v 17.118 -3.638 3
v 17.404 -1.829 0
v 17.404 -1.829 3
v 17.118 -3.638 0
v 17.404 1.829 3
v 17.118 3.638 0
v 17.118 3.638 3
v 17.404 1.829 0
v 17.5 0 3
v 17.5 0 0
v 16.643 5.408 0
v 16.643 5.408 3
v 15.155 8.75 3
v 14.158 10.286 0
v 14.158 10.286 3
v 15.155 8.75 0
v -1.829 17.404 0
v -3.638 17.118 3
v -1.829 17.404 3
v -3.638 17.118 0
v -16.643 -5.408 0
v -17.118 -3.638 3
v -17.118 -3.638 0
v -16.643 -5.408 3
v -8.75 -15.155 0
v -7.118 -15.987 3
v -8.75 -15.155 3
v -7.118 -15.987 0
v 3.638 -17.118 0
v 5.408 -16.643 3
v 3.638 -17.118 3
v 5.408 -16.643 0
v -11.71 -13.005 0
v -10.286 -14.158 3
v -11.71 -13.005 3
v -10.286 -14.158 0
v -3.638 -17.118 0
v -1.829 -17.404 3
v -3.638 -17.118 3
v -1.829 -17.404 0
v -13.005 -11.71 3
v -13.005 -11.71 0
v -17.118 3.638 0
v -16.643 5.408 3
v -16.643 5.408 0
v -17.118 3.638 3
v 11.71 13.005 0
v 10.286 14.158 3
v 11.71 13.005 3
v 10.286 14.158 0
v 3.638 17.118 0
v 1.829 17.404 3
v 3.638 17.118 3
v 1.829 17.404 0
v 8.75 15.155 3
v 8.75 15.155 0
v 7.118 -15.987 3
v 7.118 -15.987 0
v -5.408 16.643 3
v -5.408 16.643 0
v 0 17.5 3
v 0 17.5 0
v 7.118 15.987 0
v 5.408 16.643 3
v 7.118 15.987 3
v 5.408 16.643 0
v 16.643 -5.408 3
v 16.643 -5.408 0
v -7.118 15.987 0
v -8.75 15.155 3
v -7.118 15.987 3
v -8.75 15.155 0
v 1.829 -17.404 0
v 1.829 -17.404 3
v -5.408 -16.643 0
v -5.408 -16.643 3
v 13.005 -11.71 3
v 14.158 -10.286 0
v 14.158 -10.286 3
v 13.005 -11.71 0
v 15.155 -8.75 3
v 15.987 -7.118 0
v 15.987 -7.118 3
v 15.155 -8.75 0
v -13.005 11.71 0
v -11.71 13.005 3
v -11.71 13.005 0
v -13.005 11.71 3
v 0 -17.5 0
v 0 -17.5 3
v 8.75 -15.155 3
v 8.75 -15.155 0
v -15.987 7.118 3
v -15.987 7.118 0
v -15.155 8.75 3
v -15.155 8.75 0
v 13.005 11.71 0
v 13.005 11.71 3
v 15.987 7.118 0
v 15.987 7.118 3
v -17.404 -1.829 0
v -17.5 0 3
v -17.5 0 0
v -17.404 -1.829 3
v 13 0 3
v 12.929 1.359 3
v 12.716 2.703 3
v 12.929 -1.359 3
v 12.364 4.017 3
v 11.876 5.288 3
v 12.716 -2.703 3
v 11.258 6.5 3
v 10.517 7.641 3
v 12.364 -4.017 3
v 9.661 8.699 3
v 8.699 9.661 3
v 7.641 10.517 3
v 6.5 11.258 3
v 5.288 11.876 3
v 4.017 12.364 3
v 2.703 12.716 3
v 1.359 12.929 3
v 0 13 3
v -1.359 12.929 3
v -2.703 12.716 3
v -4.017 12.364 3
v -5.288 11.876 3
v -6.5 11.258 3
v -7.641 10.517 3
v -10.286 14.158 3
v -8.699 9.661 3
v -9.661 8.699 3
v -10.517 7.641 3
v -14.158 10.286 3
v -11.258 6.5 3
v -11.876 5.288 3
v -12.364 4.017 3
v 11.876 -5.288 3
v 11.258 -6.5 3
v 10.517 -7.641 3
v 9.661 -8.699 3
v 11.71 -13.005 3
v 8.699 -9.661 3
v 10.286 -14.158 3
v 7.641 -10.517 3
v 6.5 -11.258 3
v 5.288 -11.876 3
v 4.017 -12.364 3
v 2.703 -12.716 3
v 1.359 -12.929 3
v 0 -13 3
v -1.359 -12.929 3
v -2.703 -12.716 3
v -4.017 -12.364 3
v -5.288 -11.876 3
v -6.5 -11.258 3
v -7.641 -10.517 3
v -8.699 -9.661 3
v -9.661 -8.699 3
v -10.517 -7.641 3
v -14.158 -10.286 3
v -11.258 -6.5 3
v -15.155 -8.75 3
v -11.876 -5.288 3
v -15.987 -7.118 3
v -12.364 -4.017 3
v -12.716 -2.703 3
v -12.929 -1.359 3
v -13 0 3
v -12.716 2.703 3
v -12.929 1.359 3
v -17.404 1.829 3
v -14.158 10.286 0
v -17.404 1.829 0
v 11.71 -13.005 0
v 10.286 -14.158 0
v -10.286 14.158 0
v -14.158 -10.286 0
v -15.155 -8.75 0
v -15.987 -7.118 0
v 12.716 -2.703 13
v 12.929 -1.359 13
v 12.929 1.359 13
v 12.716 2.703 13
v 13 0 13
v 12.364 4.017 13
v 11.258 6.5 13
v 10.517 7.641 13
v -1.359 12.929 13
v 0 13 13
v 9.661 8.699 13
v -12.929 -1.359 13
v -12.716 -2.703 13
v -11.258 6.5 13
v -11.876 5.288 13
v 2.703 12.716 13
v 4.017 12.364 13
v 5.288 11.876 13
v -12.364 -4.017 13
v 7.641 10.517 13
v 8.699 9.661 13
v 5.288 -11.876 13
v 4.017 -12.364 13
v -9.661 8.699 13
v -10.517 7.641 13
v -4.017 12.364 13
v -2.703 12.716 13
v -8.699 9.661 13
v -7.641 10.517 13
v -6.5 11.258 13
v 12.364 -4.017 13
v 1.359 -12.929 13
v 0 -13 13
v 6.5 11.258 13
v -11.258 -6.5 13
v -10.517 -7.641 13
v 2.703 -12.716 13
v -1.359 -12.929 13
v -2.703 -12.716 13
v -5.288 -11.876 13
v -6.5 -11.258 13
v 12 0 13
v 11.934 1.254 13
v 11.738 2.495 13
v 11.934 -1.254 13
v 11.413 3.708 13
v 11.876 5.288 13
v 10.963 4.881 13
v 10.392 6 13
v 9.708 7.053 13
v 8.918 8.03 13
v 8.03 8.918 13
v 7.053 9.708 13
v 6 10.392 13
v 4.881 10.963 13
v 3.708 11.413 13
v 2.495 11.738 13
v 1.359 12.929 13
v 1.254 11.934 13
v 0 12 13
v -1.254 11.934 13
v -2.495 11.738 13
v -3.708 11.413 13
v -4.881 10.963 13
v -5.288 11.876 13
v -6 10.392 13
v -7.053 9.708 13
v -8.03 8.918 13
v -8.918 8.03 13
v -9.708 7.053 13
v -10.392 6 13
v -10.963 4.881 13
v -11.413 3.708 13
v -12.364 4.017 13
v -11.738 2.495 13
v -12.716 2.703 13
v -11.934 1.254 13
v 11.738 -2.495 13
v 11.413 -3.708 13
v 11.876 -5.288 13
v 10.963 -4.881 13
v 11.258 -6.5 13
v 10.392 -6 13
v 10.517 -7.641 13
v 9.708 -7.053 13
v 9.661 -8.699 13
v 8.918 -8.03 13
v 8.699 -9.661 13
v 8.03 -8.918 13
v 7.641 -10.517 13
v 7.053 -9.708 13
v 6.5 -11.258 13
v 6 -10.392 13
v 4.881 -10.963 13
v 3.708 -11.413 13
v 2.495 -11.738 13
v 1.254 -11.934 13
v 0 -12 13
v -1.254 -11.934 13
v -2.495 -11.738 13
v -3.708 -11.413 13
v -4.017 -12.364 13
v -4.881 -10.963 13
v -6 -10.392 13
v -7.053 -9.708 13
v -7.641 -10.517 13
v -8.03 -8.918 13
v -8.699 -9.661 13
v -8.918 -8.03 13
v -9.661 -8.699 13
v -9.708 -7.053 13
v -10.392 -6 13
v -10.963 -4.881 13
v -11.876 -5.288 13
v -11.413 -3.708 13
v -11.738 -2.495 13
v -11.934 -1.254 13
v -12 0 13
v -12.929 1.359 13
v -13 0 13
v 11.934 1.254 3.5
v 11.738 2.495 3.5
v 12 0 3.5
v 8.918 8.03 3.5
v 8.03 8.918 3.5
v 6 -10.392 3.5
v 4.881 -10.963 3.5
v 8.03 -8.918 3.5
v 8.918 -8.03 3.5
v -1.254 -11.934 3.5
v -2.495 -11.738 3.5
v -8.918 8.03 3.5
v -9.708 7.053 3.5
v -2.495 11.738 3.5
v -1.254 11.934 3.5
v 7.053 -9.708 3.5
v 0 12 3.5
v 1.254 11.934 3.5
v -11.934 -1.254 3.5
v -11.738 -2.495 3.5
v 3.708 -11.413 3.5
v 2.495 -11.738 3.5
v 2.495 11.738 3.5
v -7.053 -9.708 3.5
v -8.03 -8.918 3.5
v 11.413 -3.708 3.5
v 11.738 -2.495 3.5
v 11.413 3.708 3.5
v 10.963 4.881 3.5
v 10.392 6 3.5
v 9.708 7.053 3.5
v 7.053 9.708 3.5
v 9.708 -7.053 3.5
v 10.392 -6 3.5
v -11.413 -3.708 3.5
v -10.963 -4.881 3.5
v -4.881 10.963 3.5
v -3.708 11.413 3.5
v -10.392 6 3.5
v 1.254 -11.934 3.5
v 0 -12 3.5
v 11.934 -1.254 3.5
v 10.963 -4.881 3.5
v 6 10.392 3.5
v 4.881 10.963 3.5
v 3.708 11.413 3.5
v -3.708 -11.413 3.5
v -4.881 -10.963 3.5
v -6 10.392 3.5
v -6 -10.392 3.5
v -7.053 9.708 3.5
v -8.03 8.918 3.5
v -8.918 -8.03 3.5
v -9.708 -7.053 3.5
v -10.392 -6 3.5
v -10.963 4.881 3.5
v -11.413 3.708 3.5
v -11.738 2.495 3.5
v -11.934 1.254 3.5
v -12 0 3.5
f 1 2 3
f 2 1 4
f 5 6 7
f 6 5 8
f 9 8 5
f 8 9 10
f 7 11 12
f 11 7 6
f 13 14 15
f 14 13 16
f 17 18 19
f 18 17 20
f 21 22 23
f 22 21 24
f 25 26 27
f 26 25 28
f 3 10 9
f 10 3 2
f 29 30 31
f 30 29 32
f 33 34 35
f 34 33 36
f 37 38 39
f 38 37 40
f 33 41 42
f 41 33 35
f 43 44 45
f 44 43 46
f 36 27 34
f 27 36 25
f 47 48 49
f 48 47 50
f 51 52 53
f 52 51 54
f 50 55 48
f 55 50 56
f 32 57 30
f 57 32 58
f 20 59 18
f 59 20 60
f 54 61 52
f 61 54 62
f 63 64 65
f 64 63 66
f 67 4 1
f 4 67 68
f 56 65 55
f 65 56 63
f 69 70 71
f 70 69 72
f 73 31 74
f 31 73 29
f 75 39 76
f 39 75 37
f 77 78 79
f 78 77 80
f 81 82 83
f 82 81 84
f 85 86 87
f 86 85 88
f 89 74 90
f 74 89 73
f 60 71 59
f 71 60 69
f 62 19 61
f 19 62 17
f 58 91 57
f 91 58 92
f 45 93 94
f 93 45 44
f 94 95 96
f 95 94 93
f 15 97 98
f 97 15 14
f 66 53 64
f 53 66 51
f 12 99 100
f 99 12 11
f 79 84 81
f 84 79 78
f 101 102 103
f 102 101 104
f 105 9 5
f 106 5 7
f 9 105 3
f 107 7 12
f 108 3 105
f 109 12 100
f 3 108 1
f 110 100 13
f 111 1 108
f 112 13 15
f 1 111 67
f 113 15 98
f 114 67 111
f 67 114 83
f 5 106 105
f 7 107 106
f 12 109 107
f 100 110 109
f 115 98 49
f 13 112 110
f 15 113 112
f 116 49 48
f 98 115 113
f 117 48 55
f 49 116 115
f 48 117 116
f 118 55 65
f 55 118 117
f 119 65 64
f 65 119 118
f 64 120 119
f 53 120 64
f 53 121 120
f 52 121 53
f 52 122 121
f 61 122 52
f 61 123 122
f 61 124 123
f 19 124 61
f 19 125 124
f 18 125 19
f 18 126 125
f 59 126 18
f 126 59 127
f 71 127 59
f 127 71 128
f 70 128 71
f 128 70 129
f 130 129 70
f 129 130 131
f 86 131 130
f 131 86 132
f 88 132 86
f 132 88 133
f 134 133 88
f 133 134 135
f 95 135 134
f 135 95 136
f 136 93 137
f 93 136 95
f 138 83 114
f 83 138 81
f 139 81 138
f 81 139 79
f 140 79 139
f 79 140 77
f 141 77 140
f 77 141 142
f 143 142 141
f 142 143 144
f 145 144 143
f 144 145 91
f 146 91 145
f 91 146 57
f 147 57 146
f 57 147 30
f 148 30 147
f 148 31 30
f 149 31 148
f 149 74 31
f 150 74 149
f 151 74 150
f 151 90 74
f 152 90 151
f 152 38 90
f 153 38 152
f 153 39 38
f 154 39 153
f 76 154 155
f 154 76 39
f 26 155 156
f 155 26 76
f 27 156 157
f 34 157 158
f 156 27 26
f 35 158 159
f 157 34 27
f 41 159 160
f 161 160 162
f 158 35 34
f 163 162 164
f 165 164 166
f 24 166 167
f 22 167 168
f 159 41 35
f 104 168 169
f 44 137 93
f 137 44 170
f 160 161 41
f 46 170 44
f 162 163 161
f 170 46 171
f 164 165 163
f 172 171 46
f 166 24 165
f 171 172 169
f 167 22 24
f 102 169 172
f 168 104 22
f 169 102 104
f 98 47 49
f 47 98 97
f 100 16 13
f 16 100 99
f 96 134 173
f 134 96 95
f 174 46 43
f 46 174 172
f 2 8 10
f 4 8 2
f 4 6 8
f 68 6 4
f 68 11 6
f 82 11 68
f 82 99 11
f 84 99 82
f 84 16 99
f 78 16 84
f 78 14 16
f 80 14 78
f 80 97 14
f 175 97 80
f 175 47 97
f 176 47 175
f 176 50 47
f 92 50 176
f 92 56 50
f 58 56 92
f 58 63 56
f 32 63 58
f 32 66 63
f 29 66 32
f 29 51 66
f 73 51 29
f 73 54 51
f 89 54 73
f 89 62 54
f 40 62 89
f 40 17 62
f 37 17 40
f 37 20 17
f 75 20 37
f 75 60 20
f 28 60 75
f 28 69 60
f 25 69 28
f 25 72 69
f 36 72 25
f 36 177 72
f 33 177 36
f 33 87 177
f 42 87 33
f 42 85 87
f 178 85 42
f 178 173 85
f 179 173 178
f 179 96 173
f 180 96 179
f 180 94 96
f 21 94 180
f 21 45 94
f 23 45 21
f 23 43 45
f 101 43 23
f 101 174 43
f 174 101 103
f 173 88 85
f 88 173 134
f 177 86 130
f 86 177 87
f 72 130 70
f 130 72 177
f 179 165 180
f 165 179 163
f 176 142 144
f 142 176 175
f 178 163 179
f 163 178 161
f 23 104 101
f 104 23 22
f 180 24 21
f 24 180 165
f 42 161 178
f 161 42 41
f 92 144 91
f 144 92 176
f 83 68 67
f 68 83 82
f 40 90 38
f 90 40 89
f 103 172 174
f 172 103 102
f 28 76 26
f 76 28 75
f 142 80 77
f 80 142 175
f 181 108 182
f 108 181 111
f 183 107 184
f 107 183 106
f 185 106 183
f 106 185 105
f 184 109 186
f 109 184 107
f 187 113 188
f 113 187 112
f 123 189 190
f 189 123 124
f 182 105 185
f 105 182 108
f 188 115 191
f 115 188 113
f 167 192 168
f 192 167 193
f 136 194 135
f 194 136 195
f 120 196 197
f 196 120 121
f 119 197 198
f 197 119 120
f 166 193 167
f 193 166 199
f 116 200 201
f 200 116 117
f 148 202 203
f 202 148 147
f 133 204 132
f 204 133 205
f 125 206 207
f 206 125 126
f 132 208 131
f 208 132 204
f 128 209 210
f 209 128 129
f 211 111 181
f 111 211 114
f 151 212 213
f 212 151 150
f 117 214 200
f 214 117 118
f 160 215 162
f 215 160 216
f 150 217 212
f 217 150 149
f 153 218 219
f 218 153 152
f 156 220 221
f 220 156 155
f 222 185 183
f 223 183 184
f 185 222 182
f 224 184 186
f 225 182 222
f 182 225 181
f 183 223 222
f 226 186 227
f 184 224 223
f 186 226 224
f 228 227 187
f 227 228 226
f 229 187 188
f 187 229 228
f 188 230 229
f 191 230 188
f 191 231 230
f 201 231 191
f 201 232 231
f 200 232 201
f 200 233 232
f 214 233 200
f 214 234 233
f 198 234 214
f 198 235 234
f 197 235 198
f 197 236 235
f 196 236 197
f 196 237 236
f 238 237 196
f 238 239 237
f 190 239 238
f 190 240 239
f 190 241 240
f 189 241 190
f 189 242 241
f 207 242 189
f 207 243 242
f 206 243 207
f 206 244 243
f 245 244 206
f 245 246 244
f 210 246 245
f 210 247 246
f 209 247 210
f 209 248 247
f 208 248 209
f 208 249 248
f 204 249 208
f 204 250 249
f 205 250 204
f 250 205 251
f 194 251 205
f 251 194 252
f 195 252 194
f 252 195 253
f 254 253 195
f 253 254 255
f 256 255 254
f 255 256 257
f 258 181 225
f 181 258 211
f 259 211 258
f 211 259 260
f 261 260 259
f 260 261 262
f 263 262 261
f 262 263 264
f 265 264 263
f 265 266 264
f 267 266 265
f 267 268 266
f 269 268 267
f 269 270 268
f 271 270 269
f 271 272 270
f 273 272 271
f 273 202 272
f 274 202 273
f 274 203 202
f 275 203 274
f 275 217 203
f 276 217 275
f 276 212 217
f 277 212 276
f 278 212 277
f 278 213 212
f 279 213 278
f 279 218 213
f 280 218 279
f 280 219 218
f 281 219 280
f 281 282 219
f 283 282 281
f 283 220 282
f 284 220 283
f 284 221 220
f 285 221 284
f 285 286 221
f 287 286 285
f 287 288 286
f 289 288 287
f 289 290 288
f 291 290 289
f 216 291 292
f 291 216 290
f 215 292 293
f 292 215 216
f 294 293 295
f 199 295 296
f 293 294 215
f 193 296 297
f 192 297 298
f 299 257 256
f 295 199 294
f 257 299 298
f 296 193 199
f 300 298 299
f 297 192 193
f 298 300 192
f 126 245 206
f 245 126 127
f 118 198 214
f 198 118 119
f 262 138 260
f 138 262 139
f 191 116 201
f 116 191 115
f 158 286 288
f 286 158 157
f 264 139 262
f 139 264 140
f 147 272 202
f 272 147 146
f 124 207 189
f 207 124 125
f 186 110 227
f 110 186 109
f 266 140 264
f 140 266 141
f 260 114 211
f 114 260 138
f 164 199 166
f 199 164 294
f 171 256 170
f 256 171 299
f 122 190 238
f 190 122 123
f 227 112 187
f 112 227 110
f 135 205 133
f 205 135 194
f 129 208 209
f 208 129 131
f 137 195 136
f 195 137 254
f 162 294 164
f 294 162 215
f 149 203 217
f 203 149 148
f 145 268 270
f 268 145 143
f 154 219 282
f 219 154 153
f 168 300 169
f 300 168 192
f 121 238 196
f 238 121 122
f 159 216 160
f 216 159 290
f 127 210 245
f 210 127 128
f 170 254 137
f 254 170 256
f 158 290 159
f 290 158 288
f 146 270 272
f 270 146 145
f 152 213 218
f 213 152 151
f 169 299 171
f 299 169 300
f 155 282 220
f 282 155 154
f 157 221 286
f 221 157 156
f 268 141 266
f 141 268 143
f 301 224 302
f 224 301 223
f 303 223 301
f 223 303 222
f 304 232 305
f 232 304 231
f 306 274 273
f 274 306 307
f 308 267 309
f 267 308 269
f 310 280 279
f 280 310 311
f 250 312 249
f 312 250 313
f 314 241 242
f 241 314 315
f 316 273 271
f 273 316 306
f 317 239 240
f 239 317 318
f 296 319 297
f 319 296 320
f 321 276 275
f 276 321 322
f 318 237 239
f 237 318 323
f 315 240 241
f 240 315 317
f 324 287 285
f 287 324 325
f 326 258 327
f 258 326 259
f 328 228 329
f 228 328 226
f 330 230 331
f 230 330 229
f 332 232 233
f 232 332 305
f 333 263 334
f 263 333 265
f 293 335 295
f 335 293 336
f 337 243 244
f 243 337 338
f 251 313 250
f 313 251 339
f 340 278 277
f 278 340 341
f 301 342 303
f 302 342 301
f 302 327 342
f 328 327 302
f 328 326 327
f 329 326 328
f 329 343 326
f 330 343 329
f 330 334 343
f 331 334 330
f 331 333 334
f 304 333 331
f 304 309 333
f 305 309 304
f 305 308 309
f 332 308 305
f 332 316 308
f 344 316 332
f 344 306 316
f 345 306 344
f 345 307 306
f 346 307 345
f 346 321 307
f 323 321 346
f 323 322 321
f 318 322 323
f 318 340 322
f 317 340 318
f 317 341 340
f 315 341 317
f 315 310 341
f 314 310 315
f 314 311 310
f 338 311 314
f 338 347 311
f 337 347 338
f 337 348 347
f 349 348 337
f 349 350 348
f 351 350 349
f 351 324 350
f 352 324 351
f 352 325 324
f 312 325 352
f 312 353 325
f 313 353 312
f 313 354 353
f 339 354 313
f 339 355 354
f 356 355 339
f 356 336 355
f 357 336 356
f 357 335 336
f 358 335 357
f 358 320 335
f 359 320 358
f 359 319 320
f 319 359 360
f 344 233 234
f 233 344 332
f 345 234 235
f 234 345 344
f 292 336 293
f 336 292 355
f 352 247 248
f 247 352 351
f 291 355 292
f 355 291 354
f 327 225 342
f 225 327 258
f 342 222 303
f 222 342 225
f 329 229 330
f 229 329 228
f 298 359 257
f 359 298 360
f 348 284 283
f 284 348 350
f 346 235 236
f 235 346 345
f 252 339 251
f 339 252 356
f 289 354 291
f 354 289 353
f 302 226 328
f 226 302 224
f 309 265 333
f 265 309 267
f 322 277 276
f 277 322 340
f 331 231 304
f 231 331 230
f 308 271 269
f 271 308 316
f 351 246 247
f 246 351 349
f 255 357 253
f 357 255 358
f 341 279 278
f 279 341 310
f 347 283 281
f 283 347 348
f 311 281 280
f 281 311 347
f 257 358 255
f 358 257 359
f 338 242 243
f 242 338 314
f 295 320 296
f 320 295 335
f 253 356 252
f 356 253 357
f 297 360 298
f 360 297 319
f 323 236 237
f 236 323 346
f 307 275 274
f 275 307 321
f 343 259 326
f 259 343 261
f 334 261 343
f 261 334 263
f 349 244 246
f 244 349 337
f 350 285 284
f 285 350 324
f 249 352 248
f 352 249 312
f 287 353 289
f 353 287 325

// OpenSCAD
/*******************************************************
 PVC plug
v1.0 by Cpayn3d  Sept 2017  
*******************************************************/

// preview[view:south, tilt:top]

/* [Plug Neck] */
// - diameter of the plug neck
PlugDiam = 26; //[6:100]

// - plug Smoothness
PlugFacets = 60; //[25:100]

// - neck Height
PlugHeight = 10; //[6:50]

// - neck wall thickness
PlugWall = 2; //[1:10]  

//--------------------------------

// - diameter of the shoulder
PlugShDiam = 35; //[6:140]  

// - shoulder smoothness
ShFacets = 60; //[25:80]

// - shoulder height
PlugShHeight = 3;    //[1:10]   

// - diameter of drain hole
DrainHoleDiam = 0;  //[0:50]


partlayout(); 


module partlayout() {      
difference() {
// primary body
union() {
    
cylinder(h=PlugShHeight, r=PlugShDiam /2, $fn=ShFacets); // plug shoulder 
translate([0, 0, PlugShHeight]) cylinder(h=PlugHeight, r=PlugDiam /2, $fn=PlugFacets); // plug neck 

} // end union    
 
    

// diff section
union() {
translate([0, 0, PlugShHeight+0.5]) cylinder(h=PlugHeight +1, r=(PlugDiam-PlugWall) /2, $fn=PlugFacets); // plug inner cutout 

translate([0, 0, -1]) cylinder(h=PlugShHeight +2, r=(DrainHoleDiam) /2, $fn=ShFacets); // drain hole 
 
  }  // end diff union
 } // end diff
} // end module - parts layout
  
  
